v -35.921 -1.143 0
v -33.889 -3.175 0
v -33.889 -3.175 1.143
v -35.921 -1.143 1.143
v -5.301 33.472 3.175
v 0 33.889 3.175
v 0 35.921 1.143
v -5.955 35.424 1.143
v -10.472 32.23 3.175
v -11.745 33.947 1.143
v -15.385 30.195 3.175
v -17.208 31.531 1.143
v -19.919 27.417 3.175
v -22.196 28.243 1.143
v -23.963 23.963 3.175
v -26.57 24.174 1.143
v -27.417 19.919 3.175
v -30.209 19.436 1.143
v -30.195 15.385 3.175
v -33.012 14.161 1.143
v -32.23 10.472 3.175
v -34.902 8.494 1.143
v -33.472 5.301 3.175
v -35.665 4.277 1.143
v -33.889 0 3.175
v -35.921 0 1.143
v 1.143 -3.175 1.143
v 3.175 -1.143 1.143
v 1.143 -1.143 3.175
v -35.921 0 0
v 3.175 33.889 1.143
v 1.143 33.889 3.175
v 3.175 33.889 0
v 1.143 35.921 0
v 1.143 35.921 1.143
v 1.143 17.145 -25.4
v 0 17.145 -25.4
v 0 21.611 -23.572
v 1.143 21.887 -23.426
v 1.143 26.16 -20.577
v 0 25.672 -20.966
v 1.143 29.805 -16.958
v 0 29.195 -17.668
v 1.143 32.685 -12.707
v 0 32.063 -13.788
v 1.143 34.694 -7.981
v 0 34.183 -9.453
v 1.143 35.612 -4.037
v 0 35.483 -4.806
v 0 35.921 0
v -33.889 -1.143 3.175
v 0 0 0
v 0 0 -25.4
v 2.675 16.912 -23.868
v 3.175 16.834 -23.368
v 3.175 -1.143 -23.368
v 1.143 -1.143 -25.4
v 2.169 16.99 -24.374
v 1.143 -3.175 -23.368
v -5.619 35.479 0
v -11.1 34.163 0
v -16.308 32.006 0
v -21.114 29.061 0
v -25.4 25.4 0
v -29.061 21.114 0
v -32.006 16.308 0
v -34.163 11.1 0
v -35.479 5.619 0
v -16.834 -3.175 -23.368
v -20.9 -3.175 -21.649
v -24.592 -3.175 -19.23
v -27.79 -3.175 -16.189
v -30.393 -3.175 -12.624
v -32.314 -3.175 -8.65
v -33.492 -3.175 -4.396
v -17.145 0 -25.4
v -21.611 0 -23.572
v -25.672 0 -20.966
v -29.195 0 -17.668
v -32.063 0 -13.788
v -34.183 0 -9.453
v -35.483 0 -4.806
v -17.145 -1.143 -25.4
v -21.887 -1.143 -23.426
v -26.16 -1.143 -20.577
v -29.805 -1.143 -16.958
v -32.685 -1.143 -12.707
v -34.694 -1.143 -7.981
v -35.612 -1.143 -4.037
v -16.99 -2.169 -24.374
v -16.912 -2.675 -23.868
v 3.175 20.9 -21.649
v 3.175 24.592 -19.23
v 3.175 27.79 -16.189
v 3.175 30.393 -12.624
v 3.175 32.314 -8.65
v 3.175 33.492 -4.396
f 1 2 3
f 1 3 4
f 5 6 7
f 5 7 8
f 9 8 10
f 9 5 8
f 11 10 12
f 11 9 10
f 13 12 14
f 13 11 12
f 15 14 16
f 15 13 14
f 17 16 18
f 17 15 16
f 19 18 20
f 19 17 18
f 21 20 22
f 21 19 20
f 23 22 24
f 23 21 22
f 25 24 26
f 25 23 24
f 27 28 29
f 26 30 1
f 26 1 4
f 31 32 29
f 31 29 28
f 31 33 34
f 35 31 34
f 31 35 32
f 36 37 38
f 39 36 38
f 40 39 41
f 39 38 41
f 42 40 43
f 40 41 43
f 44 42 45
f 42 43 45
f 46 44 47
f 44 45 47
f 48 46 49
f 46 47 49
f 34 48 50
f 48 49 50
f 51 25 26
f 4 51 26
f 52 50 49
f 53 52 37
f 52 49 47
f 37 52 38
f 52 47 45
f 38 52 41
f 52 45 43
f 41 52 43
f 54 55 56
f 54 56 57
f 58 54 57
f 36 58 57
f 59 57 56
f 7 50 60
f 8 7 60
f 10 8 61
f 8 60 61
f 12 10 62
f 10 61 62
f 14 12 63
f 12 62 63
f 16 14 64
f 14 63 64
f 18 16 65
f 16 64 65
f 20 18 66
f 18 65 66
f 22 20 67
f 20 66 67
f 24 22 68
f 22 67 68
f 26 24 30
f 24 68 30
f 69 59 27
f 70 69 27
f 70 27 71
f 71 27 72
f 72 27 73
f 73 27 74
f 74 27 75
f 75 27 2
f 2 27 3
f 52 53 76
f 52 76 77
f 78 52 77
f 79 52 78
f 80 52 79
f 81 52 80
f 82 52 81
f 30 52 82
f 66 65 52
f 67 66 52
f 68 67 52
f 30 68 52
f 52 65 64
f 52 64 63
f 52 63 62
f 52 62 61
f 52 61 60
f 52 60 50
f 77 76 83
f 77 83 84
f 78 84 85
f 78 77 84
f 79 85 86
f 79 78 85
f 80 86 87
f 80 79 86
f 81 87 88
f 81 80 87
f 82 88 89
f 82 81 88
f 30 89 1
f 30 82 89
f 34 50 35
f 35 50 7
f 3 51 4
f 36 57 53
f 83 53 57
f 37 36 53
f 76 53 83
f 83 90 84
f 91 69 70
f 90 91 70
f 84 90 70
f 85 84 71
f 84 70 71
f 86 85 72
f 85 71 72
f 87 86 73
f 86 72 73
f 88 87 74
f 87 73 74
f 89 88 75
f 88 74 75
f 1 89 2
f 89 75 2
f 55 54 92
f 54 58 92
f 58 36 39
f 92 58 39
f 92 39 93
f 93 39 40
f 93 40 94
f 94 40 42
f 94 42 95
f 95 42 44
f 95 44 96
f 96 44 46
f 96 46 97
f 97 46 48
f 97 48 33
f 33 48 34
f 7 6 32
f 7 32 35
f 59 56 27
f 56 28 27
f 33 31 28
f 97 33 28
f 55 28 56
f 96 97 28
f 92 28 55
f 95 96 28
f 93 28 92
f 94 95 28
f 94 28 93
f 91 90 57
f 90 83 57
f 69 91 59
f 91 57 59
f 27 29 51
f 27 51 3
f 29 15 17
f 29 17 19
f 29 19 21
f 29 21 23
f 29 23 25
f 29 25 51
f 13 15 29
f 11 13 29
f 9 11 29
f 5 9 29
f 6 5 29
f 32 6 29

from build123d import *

# Parameters (mm, degrees)
BOSS_EXTRUDE1_DEPTH = 3.175
BOSS_EXTRUDE2_DEPTH = 3.175
BOSS_EXTRUDE3_DEPTH = 3.175


with BuildPart() as part:
    # Sketch1 → Boss-Extrude1 (new body)
    with BuildSketch(Plane.XY):
        with BuildLine():
            Line((0, 0), (0, 35.921024484))
            ThreePointArc((0, 35.921024484), (-25.4, 25.4), (-35.921024484, 0))
            Line((-35.921024484, 0), (0, 0))
        make_face()
    extrude(amount=BOSS_EXTRUDE1_DEPTH)

    # Sketch2 → Boss-Extrude2 (add)
    with BuildSketch(Plane(origin=(0, 0, 0), x_dir=(0, 0, -1), z_dir=(1, 0, 0))):
        with BuildLine():
            Line((0, 0), (25.4, 0))
            Line((25.4, 0), (25.4, 17.145))
            ThreePointArc((25.4, 17.145), (15.793187578, 30.717442473), (0, 35.921024484))
            Line((0, 35.921024484), (-3.175, 35.921024484))
            Line((-3.175, 35.921024484), (-3.175, 0))
            Line((-3.175, 0), (0, 0))
        make_face()
    extrude(amount=BOSS_EXTRUDE2_DEPTH)

    # Sketch3 → Boss-Extrude3 (add)
    with BuildSketch(Plane.XZ):
        with BuildLine():
            Line((0, -25.4), (-17.145, -25.4))
            ThreePointArc((-17.145, -25.4), (-30.717442473, -15.793187578), (-35.921024484, 0))
            Line((-35.921024484, 0), (-35.921024484, 3.175))
            Line((-35.921024484, 3.175), (3.175, 3.175))
            Line((3.175, 3.175), (3.175, -25.4))
            Line((3.175, -25.4), (0, -25.4))
        make_face()
    extrude(amount=BOSS_EXTRUDE3_DEPTH)

    # Chamfer1
    # the kernel refuses this chamfer: 2.032 mm, written as the material it takes off along each edge
    with BuildSketch(Plane(origin=(1.820333333, 34.566357818, 1.820333333), x_dir=(0, -0.7071067811865468, 0.7071067811865481), z_dir=(0.5773502691896253, 0.5773502691896264, 0.5773502691896256))) as chamfer1_piece_1:
        Polygon((-1.436840979, -0.829560526), (1.436840979, -0.829560526), (0, 1.659121052), align=None)
    extrude(amount=2.580986643, mode=Mode.SUBTRACT)
    with BuildSketch(Plane(origin=(1.820333333, -1.820333333, -24.045333333), x_dir=(-0.7071067811865476, 0, -0.7071067811865476), z_dir=(0.5773502691896256, -0.577350269189626, -0.5773502691896256)), Plane(origin=(1.820333333, -1.820333333, 1.820333333), x_dir=(0.7071067811865476, 0, -0.7071067811865474), z_dir=(0.5773502691896254, -0.577350269189626, 0.577350269189626)), Plane(origin=(-34.566357818, -1.820333333, 1.820333333), x_dir=(0.7071067811865468, 0, 0.7071067811865481), z_dir=(-0.5773502691896263, -0.5773502691896255, 0.5773502691896255))) as chamfer1_piece_2:
        Polygon((-1.436840979, 0.829560526), (1.436840979, 0.829560526), (0, -1.659121052), align=None)
    extrude(amount=2.580986643, mode=Mode.SUBTRACT)
    with BuildSketch(Plane(origin=(0, 0, 3.175), x_dir=(0, 1, 0), z_dir=(1, 0, 0))) as chamfer1_piece_3:
        with BuildLine():
            Line((35.978498123, -2.089473639), (33.831550845, 0.057473639))
            Line((33.831550845, 0.057473639), (33.831550845, 0.098113639))
            ThreePointArc((33.831550845, 0.098113639), (34.876287665, 0.04064), (35.921024484, 0.04064))
            Line((35.921024484, 0.04064), (35.961664484, 0))
            ThreePointArc((35.961664484, 0), (35.961664484, -1.04473682), (36.019138123, -2.089473639))
            Line((36.019138123, -2.089473639), (35.978498123, -2.089473639))
        make_face()
    revolve(axis=Axis((0, 0, 3.175), (0, 0, 1)), revolution_arc=90, mode=Mode.SUBTRACT)
    with BuildSketch(Plane(origin=(0, 35.921024484, 3.175), x_dir=(0, -0.9996219169112968, 0.027495876610586455), z_dir=(1, 0, 0)), Plane(origin=(-35.921024484, -3.175, 0), x_dir=(0.9996219169112968, -0.027495876610586455, 0), z_dir=(0, 0, 1))) as chamfer1_piece_4:
        with BuildLine():
            Line((2.090263933, 0), (-0.114903819, 2.087103356))
            Line((-0.114903819, 2.087103356), (-0.155528453, 2.085985924))
            ThreePointArc((-0.155528453, 2.085985924), (-0.069350589, 1.04322439), (-0.040624635, -0.001117432))
            Line((-0.040624635, -0.001117432), (0.001117432, -0.040624635))
            ThreePointArc((0.001117432, -0.040624635), (1.045459255, -0.01189868), (2.091381365, -0.040624635))
            Line((2.091381365, -0.040624635), (2.090263933, 0))
        make_face()
    extrude(amount=8.400659832, mode=Mode.SUBTRACT)
    with BuildSketch(Plane(origin=(3.175, 22.370659832, -25.4), x_dir=(0.027495876610586455, 0, 0.9996219169112968), z_dir=(0, -1, 0))) as chamfer1_piece_5:
        with BuildLine():
            Line((2.090263933, 0), (-0.114903819, 2.087103356))
            Line((-0.114903819, 2.087103356), (-0.155528453, 2.085985924))
            ThreePointArc((-0.155528453, 2.085985924), (-0.069350589, 1.04322439), (-0.040624635, -0.001117432))
            Line((-0.040624635, -0.001117432), (0.001117432, -0.040624635))
            ThreePointArc((0.001117432, -0.040624635), (1.045459255, -0.01189868), (2.091381365, -0.040624635))
            Line((2.091381365, -0.040624635), (2.090263933, 0))
        make_face()
    extrude(amount=30.771319663, mode=Mode.SUBTRACT)
    with BuildSketch(Plane(origin=(3.175, 9.352591527, 0), x_dir=(0, 0.1007624019843993, -0.9949105177584235), z_dir=(0, -0.9949105177584235, -0.1007624019843993))) as chamfer1_piece_6:
        with BuildLine():
            Line((24.478959318, 0.057473639), (26.625906597, -2.089473639))
            Line((26.625906597, -2.089473639), (26.666546597, -2.089473639))
            ThreePointArc((26.666546597, -2.089473639), (26.609072957, -1.04473682), (26.609072957, 0))
            Line((26.609072957, 0), (26.568432957, 0.04064))
            ThreePointArc((26.568432957, 0.04064), (25.523696138, 0.04064), (24.478959318, 0.098113639))
            Line((24.478959318, 0.098113639), (24.478959318, 0.057473639))
        make_face()
    revolve(axis=Axis((3.175, 9.352591527, 0), (1, 0, 0)), revolution_arc=84.216925348, mode=Mode.SUBTRACT)
    with BuildSketch(Plane(origin=(3.175, 35.921024484, 0), x_dir=(0.027495876610586455, -0.9996219169112968, 0), z_dir=(0, 0, 1)), Plane(origin=(-35.921024484, 0, 3.175), x_dir=(0.9996219169112968, 0, 0.027495876610586455), z_dir=(0, -1, 0))) as chamfer1_piece_7:
        with BuildLine():
            Line((2.090263933, 0), (-0.114903819, -2.087103356))
            Line((-0.114903819, -2.087103356), (-0.155528453, -2.085985924))
            ThreePointArc((-0.155528453, -2.085985924), (-0.069350589, -1.04322439), (-0.040624635, 0.001117432))
            Line((-0.040624635, 0.001117432), (0.001117432, 0.040624635))
            ThreePointArc((0.001117432, 0.040624635), (1.045459255, 0.01189868), (2.091381365, 0.040624635))
            Line((2.091381365, 0.040624635), (2.090263933, 0))
        make_face()
    extrude(amount=8.400659832, mode=Mode.SUBTRACT)
    with BuildSketch(Plane(origin=(3.175, -8.400659832, 3.175), x_dir=(-0.9996219169112968, 0, 0.027495876610586435), z_dir=(0, 1, 0)), Plane(origin=(-41.146684316, -3.175, 3.175), x_dir=(0, 0.9996219169112968, 0.027495876610586435), z_dir=(1, 0, 0))) as chamfer1_piece_8:
        with BuildLine():
            Line((2.090263933, 0), (-0.114903819, -2.087103356))
            Line((-0.114903819, -2.087103356), (-0.155528453, -2.085985924))
            ThreePointArc((-0.155528453, -2.085985924), (-0.069350589, -1.04322439), (-0.040624635, 0.001117432))
            Line((-0.040624635, 0.001117432), (0.001117432, 0.040624635))
            ThreePointArc((0.001117432, 0.040624635), (1.045459255, 0.01189868), (2.091381365, 0.040624635))
            Line((2.091381365, 0.040624635), (2.090263933, 0))
        make_face()
    extrude(amount=49.547344147, mode=Mode.SUBTRACT)
    with BuildSketch(Plane(origin=(8.400659832, -3.175, -25.4), x_dir=(0, 0.9996219169112968, -0.027495876610585585), z_dir=(-1, 0, 0))) as chamfer1_piece_9:
        with BuildLine():
            Line((2.090263933, 0), (-0.114903819, -2.087103356))
            Line((-0.114903819, -2.087103356), (-0.155528453, -2.085985924))
            ThreePointArc((-0.155528453, -2.085985924), (-0.069350589, -1.04322439), (-0.040624635, 0.001117432))
            Line((-0.040624635, 0.001117432), (0.001117432, 0.040624635))
            ThreePointArc((0.001117432, 0.040624635), (1.045459255, 0.01189868), (2.091381365, 0.040624635))
            Line((2.091381365, 0.040624635), (2.090263933, 0))
        make_face()
    extrude(amount=30.771319663, mode=Mode.SUBTRACT)
    with BuildSketch(Plane(origin=(3.175, -3.175, 8.400659832), x_dir=(0.027495876610586435, 0.9996219169112968, 0), z_dir=(0, 0, -1))) as chamfer1_piece_10:
        with BuildLine():
            Line((2.090263933, 0), (-0.114903819, -2.087103356))
            Line((-0.114903819, -2.087103356), (-0.155528453, -2.085985924))
            ThreePointArc((-0.155528453, -2.085985924), (-0.069350589, -1.04322439), (-0.040624635, 0.001117432))
            Line((-0.040624635, 0.001117432), (0.001117432, 0.040624635))
            ThreePointArc((0.001117432, 0.040624635), (1.045459255, 0.01189868), (2.091381365, 0.040624635))
            Line((2.091381365, 0.040624635), (2.090263933, 0))
        make_face()
    extrude(amount=39.026319663, mode=Mode.SUBTRACT)
    with BuildSketch(Plane(origin=(-9.352591527, -3.175, 0), x_dir=(-0.1007624019843981, 0, -0.9949105177584237), z_dir=(0.9949105177584237, 0, -0.1007624019843981))) as chamfer1_piece_11:
        with BuildLine():
            Line((26.625906597, 2.089473639), (24.478959318, -0.057473639))
            Line((24.478959318, -0.057473639), (24.478959318, -0.098113639))
            ThreePointArc((24.478959318, -0.098113639), (25.523696138, -0.04064), (26.568432957, -0.04064))
            Line((26.568432957, -0.04064), (26.609072957, 0))
            ThreePointArc((26.609072957, 0), (26.609072957, 1.04473682), (26.666546597, 2.089473639))
            Line((26.666546597, 2.089473639), (26.625906597, 2.089473639))
        make_face()
    revolve(axis=Axis((-9.352591527, -3.175, 0), (0, 1, 0)), revolution_arc=84.216925348, mode=Mode.SUBTRACT)


solid = part.part
